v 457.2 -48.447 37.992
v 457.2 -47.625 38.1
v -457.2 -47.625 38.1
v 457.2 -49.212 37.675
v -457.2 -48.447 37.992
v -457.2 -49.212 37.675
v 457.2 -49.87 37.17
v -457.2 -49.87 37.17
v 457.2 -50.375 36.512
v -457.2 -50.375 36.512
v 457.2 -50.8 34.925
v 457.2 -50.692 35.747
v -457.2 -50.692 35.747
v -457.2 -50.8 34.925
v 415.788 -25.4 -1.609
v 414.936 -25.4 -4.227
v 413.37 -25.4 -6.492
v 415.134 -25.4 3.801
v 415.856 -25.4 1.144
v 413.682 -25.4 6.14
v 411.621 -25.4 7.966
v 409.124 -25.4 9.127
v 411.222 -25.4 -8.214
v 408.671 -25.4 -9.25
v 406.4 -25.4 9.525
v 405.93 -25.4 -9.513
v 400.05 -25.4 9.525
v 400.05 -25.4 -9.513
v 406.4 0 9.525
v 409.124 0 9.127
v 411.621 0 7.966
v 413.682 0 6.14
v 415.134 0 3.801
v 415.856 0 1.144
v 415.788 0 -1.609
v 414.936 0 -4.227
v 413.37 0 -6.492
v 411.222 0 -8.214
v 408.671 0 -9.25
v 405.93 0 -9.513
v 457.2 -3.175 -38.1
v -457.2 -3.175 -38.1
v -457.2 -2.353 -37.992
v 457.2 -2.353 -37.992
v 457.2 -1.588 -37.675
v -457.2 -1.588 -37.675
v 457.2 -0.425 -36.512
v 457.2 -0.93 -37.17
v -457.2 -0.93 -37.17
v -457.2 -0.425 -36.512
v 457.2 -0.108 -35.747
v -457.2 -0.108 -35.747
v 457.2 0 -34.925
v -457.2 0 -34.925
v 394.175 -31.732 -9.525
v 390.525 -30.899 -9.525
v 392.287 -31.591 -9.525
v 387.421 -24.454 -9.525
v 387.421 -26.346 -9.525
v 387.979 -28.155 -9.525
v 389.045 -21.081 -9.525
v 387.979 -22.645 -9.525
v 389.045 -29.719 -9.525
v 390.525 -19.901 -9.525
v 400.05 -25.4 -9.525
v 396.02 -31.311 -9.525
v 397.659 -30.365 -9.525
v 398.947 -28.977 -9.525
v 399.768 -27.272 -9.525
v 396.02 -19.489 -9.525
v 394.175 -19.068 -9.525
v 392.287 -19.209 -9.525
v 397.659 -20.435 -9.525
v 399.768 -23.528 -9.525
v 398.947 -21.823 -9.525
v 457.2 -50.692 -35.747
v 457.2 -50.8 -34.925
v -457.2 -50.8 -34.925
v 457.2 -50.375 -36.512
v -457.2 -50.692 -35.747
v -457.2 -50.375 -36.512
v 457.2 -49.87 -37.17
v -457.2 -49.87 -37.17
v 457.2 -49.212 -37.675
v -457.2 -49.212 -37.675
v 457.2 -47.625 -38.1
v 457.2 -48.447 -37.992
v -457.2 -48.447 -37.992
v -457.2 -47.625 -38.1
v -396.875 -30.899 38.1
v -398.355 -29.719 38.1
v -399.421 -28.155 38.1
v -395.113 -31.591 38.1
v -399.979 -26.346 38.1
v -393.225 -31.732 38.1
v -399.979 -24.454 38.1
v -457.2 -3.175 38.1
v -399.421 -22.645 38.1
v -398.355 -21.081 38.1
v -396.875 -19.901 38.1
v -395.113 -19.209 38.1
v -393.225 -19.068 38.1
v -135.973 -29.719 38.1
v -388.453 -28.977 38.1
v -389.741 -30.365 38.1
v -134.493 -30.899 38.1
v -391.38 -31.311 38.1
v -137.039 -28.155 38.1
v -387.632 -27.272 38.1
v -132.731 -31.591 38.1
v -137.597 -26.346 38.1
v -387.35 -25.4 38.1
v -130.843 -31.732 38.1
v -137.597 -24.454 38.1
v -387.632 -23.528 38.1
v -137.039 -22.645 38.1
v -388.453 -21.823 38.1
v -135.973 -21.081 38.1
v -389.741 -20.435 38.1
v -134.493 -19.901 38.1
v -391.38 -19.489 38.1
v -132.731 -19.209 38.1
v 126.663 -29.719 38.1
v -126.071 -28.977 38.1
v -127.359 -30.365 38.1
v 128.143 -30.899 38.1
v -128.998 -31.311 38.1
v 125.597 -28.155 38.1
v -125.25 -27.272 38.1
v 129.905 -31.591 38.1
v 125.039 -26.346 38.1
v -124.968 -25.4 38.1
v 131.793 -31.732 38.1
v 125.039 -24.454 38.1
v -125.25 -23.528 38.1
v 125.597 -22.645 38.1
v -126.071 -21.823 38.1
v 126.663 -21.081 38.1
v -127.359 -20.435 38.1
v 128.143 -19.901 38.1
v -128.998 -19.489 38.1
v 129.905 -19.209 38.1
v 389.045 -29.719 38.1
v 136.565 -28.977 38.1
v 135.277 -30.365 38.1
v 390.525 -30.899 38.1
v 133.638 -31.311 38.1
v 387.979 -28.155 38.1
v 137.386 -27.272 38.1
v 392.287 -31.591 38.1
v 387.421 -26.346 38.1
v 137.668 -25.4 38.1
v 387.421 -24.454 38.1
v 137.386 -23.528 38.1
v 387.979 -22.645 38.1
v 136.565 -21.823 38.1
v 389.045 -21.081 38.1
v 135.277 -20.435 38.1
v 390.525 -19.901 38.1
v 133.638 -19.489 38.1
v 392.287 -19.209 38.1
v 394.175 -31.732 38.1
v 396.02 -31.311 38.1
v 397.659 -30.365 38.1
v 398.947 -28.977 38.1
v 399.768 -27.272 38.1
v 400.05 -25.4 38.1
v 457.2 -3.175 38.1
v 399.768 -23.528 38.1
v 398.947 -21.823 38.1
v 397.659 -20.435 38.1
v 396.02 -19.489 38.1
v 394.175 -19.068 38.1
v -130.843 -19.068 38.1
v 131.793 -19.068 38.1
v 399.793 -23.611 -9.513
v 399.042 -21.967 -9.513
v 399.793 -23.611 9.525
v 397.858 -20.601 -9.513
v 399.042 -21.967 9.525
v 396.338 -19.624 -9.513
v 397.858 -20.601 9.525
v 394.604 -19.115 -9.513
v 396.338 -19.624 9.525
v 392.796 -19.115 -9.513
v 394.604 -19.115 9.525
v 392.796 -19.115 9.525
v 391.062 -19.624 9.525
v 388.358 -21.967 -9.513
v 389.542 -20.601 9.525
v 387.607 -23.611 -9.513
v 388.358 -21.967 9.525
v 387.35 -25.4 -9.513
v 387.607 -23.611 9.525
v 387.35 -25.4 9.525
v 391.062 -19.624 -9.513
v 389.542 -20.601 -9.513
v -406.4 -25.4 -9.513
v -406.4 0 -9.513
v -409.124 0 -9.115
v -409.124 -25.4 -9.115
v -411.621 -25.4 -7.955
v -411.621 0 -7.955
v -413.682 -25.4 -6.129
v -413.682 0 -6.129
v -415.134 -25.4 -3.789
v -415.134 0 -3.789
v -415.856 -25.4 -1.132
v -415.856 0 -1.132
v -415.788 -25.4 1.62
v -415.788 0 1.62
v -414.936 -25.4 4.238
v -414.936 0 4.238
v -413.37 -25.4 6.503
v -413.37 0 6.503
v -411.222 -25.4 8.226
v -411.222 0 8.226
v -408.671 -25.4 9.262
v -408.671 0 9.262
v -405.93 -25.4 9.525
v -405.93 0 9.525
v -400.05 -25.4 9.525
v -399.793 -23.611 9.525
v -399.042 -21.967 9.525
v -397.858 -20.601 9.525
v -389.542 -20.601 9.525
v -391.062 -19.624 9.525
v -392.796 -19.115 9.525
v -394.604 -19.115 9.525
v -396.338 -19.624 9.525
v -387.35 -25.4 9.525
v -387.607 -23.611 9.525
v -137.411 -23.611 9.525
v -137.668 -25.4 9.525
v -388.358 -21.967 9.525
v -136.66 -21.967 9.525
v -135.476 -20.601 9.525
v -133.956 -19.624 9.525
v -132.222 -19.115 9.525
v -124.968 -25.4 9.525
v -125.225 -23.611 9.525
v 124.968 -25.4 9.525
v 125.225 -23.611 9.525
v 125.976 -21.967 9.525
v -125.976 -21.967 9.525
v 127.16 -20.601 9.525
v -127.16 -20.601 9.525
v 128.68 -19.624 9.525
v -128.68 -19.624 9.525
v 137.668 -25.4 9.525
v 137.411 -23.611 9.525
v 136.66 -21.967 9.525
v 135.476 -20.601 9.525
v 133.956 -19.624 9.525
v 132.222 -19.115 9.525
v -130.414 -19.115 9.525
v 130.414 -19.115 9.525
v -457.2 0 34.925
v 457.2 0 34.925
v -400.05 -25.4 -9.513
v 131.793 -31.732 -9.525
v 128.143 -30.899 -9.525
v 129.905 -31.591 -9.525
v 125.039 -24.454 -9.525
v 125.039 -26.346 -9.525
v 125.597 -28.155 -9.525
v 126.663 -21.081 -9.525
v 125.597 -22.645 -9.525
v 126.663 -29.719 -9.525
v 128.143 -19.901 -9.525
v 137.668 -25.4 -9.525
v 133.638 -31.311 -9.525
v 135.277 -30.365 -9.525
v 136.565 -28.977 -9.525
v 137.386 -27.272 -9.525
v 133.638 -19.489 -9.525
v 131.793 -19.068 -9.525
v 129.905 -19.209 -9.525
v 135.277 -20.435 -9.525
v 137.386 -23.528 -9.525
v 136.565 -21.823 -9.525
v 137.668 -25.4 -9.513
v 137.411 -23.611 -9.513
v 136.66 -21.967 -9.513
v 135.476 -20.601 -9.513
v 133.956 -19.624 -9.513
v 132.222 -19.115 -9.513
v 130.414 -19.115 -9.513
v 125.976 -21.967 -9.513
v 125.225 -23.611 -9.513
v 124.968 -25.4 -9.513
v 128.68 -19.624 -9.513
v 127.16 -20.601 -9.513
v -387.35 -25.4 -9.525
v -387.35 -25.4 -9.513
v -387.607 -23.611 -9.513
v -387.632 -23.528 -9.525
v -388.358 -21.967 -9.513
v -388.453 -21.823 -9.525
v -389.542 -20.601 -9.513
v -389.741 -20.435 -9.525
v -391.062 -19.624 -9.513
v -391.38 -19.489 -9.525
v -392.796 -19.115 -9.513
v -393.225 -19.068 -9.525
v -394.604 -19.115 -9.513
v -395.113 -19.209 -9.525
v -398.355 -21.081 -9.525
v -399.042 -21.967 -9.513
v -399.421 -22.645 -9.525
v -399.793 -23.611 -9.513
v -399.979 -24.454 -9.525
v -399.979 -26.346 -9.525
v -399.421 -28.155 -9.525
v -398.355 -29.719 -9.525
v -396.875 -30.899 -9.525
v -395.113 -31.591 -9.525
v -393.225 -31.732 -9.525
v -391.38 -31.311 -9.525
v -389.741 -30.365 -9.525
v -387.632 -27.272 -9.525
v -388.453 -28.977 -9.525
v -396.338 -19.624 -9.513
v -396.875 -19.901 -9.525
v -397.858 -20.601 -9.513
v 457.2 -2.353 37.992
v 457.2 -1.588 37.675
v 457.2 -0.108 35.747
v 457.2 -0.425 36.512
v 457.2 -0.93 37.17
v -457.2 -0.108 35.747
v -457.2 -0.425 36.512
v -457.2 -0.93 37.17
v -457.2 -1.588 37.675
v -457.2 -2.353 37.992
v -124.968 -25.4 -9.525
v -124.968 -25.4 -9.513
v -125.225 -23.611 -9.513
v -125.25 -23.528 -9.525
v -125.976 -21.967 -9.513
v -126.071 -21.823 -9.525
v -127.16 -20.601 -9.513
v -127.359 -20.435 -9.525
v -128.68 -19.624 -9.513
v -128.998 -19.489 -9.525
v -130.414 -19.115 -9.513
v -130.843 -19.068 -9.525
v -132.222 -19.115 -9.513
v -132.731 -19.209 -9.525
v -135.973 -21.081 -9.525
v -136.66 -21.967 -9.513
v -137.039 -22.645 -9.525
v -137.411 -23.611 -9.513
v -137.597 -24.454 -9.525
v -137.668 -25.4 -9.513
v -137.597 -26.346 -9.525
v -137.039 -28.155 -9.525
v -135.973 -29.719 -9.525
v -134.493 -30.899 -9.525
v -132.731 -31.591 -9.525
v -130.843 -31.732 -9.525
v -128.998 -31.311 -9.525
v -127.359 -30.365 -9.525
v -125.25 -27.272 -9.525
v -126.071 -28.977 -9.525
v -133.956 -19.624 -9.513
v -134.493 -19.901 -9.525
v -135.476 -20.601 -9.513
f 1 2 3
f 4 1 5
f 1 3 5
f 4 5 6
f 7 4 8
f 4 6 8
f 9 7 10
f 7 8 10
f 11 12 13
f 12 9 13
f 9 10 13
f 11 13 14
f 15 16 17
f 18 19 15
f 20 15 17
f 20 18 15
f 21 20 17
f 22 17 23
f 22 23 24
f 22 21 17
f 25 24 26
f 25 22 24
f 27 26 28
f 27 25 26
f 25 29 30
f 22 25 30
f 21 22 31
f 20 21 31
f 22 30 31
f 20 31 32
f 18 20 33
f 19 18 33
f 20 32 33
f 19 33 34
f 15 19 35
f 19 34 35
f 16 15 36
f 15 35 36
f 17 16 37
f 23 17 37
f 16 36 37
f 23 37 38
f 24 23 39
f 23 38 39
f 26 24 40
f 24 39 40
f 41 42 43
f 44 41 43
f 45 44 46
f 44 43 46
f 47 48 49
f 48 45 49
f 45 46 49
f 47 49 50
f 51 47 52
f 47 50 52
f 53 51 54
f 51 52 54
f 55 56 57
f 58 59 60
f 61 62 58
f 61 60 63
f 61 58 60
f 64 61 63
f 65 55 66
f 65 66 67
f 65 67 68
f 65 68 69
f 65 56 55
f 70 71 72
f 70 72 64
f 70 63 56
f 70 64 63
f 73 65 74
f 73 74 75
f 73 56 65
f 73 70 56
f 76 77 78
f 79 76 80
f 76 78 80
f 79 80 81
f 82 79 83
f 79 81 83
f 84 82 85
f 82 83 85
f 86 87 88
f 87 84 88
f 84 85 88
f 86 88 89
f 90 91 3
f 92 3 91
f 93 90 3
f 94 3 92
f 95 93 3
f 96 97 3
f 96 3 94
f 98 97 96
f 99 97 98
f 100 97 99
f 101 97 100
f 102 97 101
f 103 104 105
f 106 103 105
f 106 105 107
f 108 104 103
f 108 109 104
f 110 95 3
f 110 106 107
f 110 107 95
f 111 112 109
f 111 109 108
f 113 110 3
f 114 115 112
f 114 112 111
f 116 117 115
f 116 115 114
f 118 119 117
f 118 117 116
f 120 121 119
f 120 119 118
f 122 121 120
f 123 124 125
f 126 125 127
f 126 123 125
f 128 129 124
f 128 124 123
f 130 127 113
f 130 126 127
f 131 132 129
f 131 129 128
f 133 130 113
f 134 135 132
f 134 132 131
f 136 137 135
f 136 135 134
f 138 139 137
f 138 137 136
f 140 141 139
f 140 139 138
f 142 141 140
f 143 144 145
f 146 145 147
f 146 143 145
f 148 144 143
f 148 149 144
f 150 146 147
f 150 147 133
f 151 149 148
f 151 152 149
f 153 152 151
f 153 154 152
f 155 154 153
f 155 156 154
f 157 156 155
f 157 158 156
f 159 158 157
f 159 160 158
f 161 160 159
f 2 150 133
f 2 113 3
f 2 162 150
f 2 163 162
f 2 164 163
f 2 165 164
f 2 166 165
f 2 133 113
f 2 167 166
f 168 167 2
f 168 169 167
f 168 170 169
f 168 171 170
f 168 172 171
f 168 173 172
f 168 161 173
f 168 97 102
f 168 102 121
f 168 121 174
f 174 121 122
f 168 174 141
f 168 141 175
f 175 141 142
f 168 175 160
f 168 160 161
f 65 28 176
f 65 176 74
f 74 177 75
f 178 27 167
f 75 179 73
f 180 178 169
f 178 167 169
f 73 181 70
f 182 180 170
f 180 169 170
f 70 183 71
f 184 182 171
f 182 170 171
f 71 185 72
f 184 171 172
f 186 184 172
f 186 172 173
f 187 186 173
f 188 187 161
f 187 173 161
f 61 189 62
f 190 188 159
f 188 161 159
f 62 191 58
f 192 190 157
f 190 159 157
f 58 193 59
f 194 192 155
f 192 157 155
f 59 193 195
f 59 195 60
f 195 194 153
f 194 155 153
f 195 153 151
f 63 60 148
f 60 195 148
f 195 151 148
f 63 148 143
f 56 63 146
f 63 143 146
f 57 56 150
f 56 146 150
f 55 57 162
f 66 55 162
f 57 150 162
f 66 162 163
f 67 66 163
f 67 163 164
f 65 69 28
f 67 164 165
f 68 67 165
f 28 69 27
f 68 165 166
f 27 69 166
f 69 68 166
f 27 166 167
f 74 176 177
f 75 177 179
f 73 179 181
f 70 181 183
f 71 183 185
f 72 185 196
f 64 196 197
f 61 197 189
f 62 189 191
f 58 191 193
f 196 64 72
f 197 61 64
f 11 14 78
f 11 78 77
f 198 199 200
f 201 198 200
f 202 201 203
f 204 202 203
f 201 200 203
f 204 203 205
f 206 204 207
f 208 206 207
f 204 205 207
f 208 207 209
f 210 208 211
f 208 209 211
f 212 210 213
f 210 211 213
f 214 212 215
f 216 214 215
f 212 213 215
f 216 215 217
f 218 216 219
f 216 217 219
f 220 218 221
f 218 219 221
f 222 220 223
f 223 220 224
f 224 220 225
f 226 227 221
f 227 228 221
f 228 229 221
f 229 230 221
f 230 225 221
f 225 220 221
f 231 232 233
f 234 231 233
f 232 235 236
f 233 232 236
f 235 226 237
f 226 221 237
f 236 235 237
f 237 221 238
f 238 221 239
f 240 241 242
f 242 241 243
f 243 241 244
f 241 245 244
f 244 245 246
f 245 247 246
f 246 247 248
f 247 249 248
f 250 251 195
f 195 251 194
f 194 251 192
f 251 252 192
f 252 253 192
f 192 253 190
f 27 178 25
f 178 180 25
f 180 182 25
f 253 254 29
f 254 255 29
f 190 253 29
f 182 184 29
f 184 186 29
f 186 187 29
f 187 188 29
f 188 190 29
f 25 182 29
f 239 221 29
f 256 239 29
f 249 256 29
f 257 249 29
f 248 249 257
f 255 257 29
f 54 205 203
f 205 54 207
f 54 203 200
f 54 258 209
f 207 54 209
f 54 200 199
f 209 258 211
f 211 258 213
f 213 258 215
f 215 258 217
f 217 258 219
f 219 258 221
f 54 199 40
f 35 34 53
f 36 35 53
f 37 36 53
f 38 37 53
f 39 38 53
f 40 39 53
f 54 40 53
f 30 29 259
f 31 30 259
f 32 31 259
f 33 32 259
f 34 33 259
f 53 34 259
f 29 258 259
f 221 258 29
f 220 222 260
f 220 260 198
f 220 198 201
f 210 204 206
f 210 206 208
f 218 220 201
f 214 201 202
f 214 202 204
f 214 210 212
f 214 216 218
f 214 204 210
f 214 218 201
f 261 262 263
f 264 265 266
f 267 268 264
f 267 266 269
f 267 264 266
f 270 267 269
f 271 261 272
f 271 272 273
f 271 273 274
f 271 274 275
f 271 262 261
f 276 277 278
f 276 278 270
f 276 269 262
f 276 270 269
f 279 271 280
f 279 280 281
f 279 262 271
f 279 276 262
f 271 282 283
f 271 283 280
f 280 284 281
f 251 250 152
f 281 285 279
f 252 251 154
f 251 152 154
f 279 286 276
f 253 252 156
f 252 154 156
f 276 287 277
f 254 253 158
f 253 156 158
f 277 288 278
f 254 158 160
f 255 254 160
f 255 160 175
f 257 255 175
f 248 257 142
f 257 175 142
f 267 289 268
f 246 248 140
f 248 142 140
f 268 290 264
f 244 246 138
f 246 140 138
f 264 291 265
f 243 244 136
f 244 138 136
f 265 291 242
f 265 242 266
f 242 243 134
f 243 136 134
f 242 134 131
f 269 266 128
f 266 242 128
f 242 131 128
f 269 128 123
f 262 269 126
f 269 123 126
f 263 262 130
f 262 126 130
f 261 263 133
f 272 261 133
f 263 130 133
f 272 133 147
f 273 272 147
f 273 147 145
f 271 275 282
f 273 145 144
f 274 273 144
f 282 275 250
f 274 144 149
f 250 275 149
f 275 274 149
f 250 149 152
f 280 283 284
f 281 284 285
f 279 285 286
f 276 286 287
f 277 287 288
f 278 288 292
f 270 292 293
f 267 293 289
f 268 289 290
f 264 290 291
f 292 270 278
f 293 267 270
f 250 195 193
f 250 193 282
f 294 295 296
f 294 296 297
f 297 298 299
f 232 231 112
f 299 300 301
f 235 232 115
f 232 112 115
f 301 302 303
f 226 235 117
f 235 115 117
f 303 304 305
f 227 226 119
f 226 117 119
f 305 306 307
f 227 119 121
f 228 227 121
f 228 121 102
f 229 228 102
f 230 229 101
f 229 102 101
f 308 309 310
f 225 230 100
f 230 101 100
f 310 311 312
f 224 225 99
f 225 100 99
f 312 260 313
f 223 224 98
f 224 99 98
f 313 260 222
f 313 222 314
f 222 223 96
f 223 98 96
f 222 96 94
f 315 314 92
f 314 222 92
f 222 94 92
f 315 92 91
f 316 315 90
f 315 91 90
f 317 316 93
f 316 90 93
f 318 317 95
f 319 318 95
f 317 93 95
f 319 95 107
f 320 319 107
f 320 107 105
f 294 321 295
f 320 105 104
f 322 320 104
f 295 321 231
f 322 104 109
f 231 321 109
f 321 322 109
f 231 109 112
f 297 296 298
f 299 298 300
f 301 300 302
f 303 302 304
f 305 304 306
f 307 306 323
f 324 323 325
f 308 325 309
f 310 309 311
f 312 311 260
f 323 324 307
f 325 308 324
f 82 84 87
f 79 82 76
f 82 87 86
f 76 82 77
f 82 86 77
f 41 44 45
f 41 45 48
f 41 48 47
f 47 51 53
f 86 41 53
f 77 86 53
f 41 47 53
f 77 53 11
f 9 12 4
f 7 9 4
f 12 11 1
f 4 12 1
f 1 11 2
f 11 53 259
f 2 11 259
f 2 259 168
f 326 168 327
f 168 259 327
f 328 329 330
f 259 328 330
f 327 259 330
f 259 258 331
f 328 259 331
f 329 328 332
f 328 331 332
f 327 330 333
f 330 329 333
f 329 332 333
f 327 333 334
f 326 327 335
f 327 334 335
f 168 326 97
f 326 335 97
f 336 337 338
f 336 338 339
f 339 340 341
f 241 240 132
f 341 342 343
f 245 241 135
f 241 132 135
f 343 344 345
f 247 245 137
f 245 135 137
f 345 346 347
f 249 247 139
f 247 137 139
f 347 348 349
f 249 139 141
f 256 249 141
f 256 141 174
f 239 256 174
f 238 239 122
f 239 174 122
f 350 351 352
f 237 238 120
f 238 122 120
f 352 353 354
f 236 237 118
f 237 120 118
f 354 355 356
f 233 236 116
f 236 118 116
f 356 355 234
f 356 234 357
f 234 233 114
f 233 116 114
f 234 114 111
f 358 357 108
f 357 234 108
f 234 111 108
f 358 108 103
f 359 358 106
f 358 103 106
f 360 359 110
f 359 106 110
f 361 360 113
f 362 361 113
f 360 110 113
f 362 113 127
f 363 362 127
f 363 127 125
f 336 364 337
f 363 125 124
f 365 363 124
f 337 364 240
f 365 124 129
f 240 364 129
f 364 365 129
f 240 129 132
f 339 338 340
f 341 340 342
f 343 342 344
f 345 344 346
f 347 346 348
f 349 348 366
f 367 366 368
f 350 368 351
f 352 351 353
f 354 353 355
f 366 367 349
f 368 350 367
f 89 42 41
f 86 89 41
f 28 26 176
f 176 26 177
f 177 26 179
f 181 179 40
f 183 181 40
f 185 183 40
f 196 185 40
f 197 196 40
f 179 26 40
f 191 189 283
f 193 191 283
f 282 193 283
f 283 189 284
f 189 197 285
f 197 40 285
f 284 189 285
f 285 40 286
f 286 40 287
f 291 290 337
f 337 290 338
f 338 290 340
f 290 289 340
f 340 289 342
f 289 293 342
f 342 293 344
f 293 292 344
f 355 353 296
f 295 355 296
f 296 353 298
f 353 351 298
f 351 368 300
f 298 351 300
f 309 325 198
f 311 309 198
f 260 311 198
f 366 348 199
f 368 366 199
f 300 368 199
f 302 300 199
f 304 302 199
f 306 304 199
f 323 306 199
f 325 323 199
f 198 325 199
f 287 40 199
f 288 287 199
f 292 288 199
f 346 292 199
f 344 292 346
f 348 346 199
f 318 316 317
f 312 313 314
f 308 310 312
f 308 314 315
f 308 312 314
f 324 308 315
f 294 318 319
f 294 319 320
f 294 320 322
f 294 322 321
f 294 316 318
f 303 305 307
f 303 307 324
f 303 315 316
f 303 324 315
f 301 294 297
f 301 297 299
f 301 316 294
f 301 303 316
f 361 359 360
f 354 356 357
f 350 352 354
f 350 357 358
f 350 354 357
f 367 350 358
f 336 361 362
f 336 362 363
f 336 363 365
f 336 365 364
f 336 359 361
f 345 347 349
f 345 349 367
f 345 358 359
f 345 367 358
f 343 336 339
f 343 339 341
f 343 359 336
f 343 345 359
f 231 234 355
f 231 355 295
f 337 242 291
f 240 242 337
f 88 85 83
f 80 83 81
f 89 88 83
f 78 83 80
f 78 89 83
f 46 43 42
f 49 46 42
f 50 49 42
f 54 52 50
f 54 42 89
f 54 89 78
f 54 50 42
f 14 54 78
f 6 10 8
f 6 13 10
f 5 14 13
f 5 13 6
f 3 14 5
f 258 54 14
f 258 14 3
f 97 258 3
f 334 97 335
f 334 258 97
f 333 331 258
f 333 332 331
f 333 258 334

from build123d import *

# Parameters (mm, degrees)
F0_W     = 914.4
F0_H     = 76.2
F1_DEPTH = 50.8
F2_R     = 6.35
F3_DEPTH = 47.625
F5_DEPTH = 25.4
F7_DEPTH = 914.401


with BuildPart() as f1:
    # F0 (on Front) → F1 (new body)
    with BuildSketch(Plane.XZ):
        Rectangle(F0_W, F0_H)
    extrude(amount=F1_DEPTH)

    # F2 (on face) → F3 (cut)
    with BuildSketch(Plane.XY.offset(38.1)):
        with Locations((-393.7, -25.4)):
            Circle(F2_R)
        with Locations((393.7, -25.4)):
            Circle(F2_R)
        with Locations((-131.318, -25.4)):
            Circle(F2_R)
        with Locations((131.318, -25.4)):
            Circle(F2_R)
    extrude(amount=-F3_DEPTH, mode=Mode.SUBTRACT)

    # F4 (on face) → F5 (cut)
    with BuildSketch(Plane(origin=(0, 0, 0), x_dir=(-1, 0, 0), z_dir=(0, 1, 0))):
        with BuildLine():
            Line((405.930353, 9.525), (-406.4, 9.525))
            ThreePointArc((-406.4, 9.525), (-415.922103, -0.234895), (-405.930353, -9.513415))
            Line((-405.930353, -9.513415), (406.4, -9.513415))
            ThreePointArc((406.4, -9.513415), (415.922103, 0.24648), (405.930353, 9.525))
        make_face()
    extrude(amount=-F5_DEPTH, mode=Mode.SUBTRACT)

    # F6 (on face) → F7 (cut, through all)
    with BuildSketch(Plane(origin=(-457.2, 0, 0), x_dir=(0, -1, 0), z_dir=(-1, 0, 0))):
        with BuildLine():
            ThreePointArc((0, 34.925), (0.929936, 37.170064), (3.175, 38.1))
            Line((3.175, 38.1), (0, 38.1))
            Line((0, 38.1), (0, 34.925))
        make_face()
        with BuildLine():
            ThreePointArc((47.625, 38.1), (49.870064, 37.170064), (50.8, 34.925))
            Line((50.8, 34.925), (50.8, 38.1))
            Line((50.8, 38.1), (47.625, 38.1))
        make_face()
        with BuildLine():
            ThreePointArc((3.175, -38.1), (0.929936, -37.170064), (0, -34.925))
            Line((0, -34.925), (0, -38.1))
            Line((0, -38.1), (3.175, -38.1))
        make_face()
        with BuildLine():
            ThreePointArc((50.8, -34.925), (49.870064, -37.170064), (47.625, -38.1))
            Line((47.625, -38.1), (50.8, -38.1))
            Line((50.8, -38.1), (50.8, -34.925))
        make_face()
    extrude(amount=-F7_DEPTH, mode=Mode.SUBTRACT)


solid = f1.part
